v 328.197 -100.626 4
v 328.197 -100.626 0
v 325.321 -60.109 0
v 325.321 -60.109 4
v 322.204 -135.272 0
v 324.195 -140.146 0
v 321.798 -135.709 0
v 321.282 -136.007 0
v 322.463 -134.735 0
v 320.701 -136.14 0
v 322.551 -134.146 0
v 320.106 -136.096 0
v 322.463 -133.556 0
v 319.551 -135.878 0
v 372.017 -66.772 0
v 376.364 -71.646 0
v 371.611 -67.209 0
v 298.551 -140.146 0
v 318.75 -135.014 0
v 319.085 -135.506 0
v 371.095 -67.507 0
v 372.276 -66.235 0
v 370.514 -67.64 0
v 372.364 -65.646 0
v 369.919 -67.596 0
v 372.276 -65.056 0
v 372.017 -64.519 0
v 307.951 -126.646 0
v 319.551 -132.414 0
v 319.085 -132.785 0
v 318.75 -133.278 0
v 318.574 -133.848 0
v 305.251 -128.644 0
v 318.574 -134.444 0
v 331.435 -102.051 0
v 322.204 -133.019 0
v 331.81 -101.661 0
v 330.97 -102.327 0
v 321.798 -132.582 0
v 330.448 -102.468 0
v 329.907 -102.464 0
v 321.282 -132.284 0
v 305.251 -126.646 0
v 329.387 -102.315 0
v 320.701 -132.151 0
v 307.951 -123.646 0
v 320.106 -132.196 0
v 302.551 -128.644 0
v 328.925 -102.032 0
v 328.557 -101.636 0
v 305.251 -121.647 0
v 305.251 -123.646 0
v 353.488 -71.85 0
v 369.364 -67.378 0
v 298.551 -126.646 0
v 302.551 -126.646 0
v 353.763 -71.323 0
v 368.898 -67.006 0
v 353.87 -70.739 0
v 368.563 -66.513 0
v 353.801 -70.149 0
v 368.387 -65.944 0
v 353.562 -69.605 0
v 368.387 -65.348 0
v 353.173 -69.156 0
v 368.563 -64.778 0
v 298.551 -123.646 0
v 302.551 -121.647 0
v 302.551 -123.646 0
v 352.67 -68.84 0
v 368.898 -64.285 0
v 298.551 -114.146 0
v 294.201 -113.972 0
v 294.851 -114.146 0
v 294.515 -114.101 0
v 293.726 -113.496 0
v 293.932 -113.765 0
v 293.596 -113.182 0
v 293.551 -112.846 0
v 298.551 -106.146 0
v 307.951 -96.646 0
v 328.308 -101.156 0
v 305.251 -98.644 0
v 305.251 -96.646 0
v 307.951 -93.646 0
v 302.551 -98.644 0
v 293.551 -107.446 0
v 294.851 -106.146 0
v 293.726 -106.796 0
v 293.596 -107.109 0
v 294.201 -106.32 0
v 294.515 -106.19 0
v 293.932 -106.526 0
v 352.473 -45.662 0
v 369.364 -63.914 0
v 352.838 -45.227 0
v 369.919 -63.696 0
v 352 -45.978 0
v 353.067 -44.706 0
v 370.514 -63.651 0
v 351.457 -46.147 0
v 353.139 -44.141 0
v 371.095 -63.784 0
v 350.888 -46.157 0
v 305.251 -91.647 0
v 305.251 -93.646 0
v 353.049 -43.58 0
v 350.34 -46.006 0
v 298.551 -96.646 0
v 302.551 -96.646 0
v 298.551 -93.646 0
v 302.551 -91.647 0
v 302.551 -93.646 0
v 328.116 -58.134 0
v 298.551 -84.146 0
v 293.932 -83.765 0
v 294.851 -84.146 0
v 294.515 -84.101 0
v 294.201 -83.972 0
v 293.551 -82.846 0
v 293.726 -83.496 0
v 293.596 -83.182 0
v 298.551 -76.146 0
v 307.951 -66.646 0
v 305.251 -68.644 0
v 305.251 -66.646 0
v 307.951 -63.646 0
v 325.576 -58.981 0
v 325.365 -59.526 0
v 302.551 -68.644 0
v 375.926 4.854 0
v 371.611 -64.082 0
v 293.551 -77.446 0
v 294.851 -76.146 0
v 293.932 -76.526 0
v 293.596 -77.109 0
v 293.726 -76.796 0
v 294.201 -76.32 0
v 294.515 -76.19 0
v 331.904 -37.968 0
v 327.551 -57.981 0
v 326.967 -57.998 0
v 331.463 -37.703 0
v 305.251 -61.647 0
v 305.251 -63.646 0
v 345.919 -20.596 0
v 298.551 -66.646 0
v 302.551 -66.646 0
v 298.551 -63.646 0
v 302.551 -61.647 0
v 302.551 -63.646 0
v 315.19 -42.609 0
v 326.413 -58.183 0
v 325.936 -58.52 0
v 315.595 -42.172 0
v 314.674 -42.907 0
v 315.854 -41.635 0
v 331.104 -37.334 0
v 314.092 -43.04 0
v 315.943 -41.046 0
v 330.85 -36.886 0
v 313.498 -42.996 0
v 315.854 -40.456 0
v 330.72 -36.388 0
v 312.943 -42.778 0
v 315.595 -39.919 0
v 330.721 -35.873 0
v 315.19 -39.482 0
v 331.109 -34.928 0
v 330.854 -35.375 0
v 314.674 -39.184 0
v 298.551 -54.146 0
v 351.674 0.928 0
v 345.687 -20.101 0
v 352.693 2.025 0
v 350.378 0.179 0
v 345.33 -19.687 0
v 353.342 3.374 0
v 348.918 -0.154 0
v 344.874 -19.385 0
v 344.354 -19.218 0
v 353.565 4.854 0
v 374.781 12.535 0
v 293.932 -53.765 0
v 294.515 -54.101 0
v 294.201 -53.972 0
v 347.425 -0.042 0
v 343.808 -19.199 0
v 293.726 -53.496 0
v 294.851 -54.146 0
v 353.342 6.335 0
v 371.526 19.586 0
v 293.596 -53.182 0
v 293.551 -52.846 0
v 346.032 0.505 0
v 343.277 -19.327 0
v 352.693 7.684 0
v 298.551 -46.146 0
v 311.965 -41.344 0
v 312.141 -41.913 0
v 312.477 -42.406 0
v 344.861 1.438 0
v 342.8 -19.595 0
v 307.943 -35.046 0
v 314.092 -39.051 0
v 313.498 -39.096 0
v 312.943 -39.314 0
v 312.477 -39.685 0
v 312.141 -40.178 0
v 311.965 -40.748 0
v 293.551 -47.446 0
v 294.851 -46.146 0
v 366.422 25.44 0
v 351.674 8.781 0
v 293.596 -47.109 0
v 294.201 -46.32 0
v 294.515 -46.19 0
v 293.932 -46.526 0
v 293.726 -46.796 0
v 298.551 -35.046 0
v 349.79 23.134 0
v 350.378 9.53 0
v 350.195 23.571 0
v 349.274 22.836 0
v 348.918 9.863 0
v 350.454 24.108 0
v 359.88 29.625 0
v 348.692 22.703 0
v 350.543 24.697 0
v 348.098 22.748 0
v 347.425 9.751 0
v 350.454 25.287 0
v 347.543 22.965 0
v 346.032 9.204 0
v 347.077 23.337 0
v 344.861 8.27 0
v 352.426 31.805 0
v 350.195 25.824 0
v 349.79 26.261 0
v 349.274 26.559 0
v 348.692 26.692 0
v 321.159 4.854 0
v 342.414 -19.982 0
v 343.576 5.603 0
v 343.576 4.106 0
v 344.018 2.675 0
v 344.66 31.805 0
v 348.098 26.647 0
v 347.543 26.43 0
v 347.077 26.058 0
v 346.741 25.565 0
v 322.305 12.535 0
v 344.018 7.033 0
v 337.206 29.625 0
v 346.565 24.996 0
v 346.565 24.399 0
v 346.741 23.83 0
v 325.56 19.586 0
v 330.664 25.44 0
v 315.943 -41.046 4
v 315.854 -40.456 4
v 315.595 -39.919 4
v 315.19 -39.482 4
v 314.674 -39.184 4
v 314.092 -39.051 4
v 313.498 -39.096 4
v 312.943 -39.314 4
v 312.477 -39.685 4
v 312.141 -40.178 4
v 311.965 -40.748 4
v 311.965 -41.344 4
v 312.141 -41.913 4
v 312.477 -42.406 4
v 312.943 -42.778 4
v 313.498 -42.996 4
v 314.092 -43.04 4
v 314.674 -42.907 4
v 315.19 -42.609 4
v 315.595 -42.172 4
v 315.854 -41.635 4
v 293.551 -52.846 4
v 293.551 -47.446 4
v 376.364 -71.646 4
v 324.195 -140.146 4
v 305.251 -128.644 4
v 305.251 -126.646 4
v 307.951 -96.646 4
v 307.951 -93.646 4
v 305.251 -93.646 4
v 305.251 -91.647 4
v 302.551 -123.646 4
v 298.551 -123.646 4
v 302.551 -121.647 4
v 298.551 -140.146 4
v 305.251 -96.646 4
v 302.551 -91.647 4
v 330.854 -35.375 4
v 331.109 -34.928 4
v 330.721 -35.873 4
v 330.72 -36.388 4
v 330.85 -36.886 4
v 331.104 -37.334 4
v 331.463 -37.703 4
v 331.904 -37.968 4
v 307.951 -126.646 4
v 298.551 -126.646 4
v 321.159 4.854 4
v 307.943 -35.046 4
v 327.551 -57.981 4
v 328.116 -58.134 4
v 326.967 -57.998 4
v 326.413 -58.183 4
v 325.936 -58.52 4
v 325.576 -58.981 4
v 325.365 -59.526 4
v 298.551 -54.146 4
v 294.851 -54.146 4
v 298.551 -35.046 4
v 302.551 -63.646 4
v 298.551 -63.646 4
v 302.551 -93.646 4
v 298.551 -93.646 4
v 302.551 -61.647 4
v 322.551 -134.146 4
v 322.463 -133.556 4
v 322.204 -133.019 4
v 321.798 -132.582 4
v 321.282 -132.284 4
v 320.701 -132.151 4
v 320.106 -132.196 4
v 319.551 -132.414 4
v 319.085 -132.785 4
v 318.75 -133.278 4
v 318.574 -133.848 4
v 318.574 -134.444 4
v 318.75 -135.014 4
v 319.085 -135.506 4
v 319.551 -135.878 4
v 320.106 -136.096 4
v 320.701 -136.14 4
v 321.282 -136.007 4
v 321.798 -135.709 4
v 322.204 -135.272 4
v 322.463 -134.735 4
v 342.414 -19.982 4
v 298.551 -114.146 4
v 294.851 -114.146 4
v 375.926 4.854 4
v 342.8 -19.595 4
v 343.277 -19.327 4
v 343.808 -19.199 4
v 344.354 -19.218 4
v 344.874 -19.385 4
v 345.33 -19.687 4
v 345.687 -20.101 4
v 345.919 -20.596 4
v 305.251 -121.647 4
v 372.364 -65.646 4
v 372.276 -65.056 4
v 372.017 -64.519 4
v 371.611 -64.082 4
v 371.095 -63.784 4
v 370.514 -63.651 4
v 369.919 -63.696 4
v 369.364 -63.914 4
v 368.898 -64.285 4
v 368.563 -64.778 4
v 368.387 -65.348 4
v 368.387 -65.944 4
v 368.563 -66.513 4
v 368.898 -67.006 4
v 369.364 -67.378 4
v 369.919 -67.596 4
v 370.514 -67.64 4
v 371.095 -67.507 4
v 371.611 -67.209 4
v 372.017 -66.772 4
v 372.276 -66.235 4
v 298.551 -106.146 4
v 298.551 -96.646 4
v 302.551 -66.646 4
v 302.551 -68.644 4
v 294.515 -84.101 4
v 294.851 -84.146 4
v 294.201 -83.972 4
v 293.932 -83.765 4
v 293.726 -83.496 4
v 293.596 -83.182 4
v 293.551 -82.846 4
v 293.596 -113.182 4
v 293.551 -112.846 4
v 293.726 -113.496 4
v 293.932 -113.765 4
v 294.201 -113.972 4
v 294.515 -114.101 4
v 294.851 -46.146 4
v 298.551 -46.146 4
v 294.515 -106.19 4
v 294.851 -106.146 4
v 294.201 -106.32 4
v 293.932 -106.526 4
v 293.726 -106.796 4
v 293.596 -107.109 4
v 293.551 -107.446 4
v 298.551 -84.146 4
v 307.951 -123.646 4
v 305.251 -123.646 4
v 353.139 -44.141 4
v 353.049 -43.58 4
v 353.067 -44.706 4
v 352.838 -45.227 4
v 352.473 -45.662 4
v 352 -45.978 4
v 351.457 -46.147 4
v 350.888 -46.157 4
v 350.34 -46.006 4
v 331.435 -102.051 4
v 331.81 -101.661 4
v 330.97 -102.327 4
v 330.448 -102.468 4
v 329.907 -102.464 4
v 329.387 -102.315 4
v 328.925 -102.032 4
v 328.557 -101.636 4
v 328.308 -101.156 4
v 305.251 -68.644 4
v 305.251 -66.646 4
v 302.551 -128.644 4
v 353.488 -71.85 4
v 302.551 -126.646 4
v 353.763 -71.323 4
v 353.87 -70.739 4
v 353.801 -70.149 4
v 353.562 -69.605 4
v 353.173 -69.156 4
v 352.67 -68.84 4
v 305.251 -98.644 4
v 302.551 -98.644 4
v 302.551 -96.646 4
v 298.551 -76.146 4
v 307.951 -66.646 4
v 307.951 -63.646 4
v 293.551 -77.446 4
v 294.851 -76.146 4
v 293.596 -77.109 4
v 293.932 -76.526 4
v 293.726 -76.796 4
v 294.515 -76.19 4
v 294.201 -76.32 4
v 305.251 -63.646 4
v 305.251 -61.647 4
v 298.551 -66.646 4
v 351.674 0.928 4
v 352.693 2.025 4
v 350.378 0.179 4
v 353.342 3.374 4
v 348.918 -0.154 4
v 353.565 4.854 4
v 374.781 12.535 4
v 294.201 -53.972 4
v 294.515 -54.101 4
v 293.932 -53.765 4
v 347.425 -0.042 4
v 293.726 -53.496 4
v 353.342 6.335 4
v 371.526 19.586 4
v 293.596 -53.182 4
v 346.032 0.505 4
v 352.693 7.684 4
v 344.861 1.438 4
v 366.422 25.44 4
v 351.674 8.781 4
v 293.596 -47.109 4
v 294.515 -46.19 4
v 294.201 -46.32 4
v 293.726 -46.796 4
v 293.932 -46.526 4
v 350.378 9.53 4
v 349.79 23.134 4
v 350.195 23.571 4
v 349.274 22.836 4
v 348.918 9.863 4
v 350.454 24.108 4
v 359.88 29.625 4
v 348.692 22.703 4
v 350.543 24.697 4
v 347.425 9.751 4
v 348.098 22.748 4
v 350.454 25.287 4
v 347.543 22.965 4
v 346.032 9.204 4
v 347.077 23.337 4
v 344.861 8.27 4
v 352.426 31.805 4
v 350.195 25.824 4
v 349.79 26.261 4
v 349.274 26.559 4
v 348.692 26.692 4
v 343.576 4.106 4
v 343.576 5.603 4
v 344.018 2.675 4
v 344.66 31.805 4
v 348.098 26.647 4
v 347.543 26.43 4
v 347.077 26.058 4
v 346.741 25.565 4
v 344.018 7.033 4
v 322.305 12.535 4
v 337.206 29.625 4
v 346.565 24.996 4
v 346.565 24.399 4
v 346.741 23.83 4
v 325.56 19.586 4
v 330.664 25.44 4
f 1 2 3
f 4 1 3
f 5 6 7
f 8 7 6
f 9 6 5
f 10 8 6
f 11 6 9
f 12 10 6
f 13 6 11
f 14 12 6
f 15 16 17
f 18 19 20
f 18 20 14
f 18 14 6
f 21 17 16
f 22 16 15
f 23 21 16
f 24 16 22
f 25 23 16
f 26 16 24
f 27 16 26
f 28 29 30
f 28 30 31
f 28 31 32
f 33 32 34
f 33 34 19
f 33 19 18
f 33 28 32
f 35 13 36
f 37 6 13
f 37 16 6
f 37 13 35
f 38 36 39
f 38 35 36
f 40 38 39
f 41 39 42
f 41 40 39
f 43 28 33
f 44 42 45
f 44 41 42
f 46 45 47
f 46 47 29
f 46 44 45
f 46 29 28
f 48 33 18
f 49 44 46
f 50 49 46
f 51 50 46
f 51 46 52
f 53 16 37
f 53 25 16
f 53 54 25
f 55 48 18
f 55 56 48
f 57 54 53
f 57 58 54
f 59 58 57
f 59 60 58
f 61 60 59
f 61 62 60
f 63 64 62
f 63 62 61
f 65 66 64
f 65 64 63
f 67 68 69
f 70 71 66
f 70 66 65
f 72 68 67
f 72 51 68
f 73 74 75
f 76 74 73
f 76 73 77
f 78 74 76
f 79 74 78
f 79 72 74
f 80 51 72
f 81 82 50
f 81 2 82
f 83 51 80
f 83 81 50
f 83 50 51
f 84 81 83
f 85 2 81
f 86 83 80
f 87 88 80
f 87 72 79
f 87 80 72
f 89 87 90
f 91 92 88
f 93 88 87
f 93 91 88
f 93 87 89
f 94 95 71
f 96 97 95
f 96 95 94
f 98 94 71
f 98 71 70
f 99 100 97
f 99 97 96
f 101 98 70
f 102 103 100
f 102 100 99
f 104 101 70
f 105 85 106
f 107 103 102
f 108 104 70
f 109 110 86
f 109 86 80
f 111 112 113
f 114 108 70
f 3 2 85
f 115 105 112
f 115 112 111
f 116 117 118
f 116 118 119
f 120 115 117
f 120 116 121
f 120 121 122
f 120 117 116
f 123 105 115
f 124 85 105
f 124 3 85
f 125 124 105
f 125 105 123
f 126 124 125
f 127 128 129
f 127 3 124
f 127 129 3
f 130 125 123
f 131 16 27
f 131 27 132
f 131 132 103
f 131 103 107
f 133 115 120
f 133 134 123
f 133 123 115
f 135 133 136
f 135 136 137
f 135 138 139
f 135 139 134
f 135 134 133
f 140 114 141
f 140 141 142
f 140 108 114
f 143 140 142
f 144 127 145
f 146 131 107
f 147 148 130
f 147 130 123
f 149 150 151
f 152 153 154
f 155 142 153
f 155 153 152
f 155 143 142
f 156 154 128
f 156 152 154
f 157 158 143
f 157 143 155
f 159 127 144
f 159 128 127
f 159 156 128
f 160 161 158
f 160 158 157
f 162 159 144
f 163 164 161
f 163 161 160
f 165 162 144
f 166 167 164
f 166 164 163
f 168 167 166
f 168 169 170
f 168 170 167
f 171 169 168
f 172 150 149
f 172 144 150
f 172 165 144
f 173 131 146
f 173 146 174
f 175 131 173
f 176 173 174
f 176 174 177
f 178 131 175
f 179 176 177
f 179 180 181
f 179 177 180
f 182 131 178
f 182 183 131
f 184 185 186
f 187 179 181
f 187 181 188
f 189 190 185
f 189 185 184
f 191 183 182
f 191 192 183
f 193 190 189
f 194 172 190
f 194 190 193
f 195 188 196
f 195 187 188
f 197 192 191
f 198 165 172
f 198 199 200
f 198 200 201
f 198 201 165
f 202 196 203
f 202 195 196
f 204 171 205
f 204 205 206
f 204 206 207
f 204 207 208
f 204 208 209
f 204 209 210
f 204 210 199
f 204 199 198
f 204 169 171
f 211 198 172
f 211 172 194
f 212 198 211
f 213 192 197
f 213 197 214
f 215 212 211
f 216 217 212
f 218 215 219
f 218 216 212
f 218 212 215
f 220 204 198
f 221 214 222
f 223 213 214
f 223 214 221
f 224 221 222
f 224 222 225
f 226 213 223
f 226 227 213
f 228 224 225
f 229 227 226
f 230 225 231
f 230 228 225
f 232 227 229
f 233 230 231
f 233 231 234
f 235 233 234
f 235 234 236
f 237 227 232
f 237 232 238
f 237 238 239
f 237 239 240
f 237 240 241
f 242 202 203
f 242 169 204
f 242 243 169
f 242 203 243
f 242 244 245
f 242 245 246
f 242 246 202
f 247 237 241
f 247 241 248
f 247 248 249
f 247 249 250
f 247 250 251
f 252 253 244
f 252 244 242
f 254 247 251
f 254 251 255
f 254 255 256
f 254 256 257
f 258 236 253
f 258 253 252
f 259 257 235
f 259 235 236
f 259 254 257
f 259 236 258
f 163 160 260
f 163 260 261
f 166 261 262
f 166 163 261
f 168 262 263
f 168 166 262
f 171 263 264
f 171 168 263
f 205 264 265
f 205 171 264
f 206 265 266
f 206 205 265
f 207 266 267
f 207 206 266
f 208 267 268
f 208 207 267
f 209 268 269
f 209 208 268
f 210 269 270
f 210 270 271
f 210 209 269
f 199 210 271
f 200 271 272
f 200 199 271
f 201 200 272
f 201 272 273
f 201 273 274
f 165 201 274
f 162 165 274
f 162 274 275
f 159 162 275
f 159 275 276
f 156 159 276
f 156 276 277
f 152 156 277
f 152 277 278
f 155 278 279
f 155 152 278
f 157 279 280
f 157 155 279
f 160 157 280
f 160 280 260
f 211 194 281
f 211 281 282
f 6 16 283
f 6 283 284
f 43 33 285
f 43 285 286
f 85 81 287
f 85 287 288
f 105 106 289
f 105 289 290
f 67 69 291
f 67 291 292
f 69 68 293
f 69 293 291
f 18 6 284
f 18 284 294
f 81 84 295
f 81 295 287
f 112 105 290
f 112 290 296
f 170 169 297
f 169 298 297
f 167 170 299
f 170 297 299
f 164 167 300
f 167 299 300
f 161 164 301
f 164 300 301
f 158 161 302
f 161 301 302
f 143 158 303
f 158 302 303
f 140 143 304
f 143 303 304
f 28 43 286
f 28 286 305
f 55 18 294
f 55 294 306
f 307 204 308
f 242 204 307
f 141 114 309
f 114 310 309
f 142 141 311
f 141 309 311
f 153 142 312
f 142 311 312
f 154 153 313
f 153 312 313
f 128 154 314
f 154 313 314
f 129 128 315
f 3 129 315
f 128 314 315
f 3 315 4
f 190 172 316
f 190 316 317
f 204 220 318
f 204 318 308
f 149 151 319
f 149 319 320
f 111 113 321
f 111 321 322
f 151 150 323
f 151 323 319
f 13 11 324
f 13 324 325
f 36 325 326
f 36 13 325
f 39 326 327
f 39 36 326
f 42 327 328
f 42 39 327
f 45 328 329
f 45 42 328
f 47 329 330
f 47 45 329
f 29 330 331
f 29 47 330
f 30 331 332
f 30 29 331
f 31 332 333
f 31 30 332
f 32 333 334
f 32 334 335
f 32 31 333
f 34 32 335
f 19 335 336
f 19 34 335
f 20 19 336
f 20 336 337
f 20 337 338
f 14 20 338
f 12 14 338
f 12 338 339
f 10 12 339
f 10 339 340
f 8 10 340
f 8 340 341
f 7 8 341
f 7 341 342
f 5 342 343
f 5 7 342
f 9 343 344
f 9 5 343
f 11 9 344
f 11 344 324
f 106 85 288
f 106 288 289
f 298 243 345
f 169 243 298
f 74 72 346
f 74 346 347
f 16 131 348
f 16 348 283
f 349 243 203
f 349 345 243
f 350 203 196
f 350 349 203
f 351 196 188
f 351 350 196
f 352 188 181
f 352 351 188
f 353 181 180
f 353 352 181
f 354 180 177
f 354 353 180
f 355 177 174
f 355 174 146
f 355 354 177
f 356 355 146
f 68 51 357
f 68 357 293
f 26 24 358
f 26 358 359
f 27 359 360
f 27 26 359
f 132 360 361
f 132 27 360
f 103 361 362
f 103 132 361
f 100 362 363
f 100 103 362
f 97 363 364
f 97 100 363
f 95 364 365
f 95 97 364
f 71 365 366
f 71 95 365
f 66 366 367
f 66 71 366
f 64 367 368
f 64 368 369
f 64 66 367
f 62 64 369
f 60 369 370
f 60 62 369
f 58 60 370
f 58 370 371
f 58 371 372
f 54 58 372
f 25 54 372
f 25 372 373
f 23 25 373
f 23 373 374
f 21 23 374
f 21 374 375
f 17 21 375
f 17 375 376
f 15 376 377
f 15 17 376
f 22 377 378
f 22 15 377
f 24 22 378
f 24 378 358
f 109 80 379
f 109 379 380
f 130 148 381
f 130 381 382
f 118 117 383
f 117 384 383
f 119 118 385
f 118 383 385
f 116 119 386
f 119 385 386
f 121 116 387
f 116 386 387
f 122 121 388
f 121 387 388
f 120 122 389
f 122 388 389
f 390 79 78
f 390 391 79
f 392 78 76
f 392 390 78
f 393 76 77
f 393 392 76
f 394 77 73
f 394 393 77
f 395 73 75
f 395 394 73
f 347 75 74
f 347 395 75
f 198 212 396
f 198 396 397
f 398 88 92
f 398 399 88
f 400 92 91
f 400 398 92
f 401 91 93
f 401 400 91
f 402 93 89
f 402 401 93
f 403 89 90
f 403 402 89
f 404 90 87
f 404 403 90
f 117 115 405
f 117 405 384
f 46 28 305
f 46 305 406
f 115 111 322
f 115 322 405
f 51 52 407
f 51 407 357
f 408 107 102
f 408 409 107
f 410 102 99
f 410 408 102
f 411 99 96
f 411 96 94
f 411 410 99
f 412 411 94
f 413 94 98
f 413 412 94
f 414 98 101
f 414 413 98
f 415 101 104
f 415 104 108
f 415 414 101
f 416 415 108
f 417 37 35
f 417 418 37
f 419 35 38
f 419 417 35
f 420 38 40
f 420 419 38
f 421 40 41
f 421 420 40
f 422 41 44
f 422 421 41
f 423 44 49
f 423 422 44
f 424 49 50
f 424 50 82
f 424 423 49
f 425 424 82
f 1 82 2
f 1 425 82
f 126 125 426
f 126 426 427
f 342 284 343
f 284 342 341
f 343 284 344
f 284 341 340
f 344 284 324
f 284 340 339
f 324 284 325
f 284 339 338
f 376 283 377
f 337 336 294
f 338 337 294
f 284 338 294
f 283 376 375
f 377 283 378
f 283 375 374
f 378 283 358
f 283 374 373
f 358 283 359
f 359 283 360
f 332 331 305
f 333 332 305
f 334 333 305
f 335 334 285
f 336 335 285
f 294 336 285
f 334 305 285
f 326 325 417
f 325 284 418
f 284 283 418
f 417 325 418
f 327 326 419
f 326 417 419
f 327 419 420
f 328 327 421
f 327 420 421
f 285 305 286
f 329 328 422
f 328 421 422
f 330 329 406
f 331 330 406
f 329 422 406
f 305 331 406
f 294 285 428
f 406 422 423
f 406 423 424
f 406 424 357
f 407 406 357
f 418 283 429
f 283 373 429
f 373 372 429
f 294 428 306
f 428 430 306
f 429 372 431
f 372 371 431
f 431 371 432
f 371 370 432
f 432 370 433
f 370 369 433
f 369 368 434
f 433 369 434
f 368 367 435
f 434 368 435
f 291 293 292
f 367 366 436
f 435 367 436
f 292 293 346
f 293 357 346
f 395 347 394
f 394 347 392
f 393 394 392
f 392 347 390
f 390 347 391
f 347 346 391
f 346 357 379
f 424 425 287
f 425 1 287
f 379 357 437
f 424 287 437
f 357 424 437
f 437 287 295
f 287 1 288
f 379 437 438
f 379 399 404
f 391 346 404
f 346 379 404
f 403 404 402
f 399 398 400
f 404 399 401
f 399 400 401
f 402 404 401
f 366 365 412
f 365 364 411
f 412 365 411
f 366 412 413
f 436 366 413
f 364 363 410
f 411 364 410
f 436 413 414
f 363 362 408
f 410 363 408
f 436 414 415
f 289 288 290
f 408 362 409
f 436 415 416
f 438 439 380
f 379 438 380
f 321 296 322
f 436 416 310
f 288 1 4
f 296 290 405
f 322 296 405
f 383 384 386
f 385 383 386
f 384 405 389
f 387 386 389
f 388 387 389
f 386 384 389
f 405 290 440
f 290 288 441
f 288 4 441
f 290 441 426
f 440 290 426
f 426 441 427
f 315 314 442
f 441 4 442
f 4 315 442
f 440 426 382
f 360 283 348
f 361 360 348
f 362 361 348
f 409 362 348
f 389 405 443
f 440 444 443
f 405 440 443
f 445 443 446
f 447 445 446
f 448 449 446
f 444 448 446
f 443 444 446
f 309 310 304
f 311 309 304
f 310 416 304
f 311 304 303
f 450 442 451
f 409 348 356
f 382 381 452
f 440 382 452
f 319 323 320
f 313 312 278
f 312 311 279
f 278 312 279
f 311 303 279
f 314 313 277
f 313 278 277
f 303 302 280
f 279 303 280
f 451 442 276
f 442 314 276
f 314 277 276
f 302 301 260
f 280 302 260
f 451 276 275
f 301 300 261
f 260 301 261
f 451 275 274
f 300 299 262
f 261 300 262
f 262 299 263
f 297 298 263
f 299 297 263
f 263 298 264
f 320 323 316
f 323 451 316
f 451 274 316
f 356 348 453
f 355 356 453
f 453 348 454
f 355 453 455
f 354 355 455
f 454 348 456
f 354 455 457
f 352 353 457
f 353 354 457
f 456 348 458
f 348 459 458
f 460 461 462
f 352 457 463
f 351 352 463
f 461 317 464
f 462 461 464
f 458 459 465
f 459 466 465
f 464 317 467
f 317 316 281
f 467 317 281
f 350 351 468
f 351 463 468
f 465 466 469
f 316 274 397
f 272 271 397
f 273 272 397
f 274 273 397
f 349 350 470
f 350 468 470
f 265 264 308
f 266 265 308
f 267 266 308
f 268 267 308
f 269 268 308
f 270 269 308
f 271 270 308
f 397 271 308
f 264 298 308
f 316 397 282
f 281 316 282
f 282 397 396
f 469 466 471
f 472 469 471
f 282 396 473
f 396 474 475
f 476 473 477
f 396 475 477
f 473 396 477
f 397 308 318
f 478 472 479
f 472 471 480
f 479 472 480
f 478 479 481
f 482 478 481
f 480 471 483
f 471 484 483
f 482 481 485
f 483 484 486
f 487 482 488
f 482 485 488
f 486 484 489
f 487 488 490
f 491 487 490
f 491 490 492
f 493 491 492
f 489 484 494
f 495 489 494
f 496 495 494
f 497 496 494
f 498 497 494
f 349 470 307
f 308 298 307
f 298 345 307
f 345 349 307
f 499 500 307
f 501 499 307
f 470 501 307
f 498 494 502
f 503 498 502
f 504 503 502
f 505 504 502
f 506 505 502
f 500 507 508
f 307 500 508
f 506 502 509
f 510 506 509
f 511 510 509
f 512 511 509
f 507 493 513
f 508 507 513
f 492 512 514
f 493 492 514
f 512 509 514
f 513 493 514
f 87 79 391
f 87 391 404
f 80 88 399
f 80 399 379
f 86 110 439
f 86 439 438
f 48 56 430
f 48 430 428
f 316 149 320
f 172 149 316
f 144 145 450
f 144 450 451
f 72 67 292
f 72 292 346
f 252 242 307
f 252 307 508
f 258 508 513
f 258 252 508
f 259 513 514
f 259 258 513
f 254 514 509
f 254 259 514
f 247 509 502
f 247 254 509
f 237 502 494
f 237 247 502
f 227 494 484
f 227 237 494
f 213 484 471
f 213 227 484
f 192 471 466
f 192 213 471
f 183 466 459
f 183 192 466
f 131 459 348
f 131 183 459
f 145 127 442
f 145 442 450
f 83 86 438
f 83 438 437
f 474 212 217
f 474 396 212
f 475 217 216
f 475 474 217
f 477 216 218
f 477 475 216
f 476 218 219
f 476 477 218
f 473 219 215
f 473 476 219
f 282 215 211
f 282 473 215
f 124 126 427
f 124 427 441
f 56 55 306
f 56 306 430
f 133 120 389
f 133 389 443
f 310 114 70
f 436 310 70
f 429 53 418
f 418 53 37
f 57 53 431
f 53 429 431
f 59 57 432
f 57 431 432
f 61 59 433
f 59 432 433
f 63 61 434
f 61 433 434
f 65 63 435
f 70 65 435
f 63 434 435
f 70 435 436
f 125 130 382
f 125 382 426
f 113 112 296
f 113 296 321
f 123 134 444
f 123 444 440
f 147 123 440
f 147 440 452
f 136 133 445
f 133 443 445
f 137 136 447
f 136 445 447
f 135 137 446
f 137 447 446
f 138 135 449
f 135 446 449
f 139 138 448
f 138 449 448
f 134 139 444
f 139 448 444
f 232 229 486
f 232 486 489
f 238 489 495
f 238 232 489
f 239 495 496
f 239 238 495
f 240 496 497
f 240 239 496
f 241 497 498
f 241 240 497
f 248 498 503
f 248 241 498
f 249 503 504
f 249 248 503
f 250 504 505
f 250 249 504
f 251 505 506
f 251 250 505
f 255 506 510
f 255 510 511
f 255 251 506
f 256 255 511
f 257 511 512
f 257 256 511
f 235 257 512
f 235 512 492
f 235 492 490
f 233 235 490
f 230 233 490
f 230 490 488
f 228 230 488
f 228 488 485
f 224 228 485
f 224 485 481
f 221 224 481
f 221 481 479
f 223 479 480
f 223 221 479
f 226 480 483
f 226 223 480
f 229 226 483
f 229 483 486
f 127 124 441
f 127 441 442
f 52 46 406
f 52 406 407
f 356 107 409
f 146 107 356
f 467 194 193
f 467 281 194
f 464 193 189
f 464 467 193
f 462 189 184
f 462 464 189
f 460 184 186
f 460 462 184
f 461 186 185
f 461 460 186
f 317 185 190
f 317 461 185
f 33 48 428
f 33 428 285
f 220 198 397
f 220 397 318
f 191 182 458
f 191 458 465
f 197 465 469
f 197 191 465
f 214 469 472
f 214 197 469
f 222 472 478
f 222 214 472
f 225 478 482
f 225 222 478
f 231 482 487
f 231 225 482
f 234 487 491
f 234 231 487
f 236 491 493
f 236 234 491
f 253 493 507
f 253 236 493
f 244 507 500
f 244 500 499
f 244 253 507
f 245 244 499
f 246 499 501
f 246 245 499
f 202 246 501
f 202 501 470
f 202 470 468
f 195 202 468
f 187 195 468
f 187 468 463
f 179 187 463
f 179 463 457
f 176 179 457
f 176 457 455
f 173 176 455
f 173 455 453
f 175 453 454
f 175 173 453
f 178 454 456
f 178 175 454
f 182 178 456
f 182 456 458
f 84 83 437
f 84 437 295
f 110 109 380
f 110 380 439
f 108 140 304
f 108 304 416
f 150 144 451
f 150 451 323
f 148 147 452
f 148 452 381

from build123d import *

# Parameters (mm, degrees)
SKETCH_1_R      = 5.0225
SKETCH_1_R_2    = 2
EXTRUDE_1_DEPTH = 4
FILLET_1_R      = 2
FILLET_2_R      = 1.3


with BuildPart() as part:
    # 草图1 → 凸台-拉伸1 (new body)
    with BuildSketch(Plane.XY):
        with BuildLine():
            Line((298.551498293, -96.645689396), (302.551498293, -96.645689396))
            Line((302.551498293, -96.645689396), (302.551498293, -98.644151028))
            Line((302.551498293, -98.644151028), (305.251498293, -98.644151028))
            Line((305.251498293, -98.644151028), (305.251498293, -96.645689396))
            Line((305.251498293, -96.645689396), (307.951498293, -96.645689396))
            Line((307.951498293, -96.645689396), (307.951498293, -93.645689396))
            Line((307.951498293, -93.645689396), (305.251498293, -93.645689396))
            Line((305.251498293, -93.645689396), (305.251498293, -91.647227763))
            Line((305.251498293, -91.647227763), (302.551498293, -91.647227763))
            Line((302.551498293, -91.647227763), (302.551498293, -93.645689396))
            Line((302.551498293, -93.645689396), (298.551498293, -93.645689396))
            Line((298.551498293, -93.645689396), (298.551498293, -84.145716775))
            Line((298.551498293, -84.145716775), (293.551498293, -84.145716775))
            Line((293.551498293, -84.145716775), (293.551498293, -76.145716775))
            Line((293.551498293, -76.145716775), (298.551498293, -76.145716775))
            Line((298.551498293, -76.145716775), (298.551498293, -66.645694374))
            Line((298.551498293, -66.645694374), (302.551498293, -66.645694374))
            Line((302.551498293, -66.645694374), (302.551498293, -68.644156006))
            Line((302.551498293, -68.644156006), (305.251498293, -68.644156006))
            Line((305.251498293, -68.644156006), (305.251498293, -66.645694374))
            Line((305.251498293, -66.645694374), (307.951498293, -66.645694374))
            Line((307.951498293, -66.645694374), (307.951498293, -63.645694374))
            Line((307.951498293, -63.645694374), (305.251498293, -63.645694374))
            Line((305.251498293, -63.645694374), (305.251498293, -61.647232741))
            Line((305.251498293, -61.647232741), (302.551498293, -61.647232741))
            Line((302.551498293, -61.647232741), (302.551498293, -63.645694374))
            Line((302.551498293, -63.645694374), (298.551498293, -63.645694374))
            Line((298.551498293, -63.645694374), (298.551498293, -54.145671973))
            Line((298.551498293, -54.145671973), (293.551498293, -54.145671973))
            Line((293.551498293, -54.145671973), (293.551498293, -46.145671973))
            Line((293.551498293, -46.145671973), (298.551498293, -46.145671973))
            Line((298.551498293, -46.145671973), (298.551498293, -35.045714286))
            Line((298.551498293, -35.045714286), (307.942857143, -35.045714286))
            Line((307.942857143, -35.045714286), (321.159325739, 4.854285714))
            ThreePointArc((321.159325739, 4.854285714), (348.542857143, 32.081451417), (375.926388547, 4.854285714))
            Line((375.926388547, 4.854285714), (376.364473934, -71.645714286))
            Line((376.364473934, -71.645714286), (324.194731876, -140.145734198))
            Line((324.194731876, -140.145734198), (298.551498293, -140.145734198))
            Line((298.551498293, -140.145734198), (298.551498293, -126.645734198))
            Line((298.551498293, -126.645734198), (302.551498293, -126.645734198))
            Line((302.551498293, -126.645734198), (302.551498293, -128.644195831))
            Line((302.551498293, -128.644195831), (305.251498293, -128.644195831))
            Line((305.251498293, -128.644195831), (305.251498293, -126.645734198))
            Line((305.251498293, -126.645734198), (307.951498293, -126.645734198))
            Line((307.951498293, -126.645734198), (307.951498293, -123.645734198))
            Line((307.951498293, -123.645734198), (305.251498293, -123.645734198))
            Line((305.251498293, -123.645734198), (305.251498293, -121.647272565))
            Line((305.251498293, -121.647272565), (302.551498293, -121.647272565))
            Line((302.551498293, -121.647272565), (302.551498293, -123.645734198))
            Line((302.551498293, -123.645734198), (298.551498293, -123.645734198))
            Line((298.551498293, -123.645734198), (298.551498293, -114.145711797))
            Line((298.551498293, -114.145711797), (293.551498293, -114.145711797))
            Line((293.551498293, -114.145711797), (293.551498293, -106.145711797))
            Line((293.551498293, -106.145711797), (298.551498293, -106.145711797))
            Line((298.551498293, -106.145711797), (298.551498293, -96.645689396))
        make_face()
        with Locations((348.542857143, 4.854285714)):
            Circle(SKETCH_1_R, mode=Mode.SUBTRACT)
        with Locations((348.542857143, 24.697471009)):
            Circle(SKETCH_1_R_2, mode=Mode.SUBTRACT)
        with Locations((320.551498293, -134.145734198)):
            Circle(SKETCH_1_R_2, mode=Mode.SUBTRACT)
        with Locations((370.364473934, -65.645714286)):
            Circle(SKETCH_1_R_2, mode=Mode.SUBTRACT)
        with Locations((313.942857143, -41.045714286)):
            Circle(SKETCH_1_R_2, mode=Mode.SUBTRACT)
        Polygon((354.95315454, -69.835495731), (328.585486884, -106.094838527), (325.087312939, -56.813896117), align=None, mode=Mode.SUBTRACT)
        Polygon((329.57699596, -36.9530828), (354.34318526, -47.751218186), (344.764617274, -16.87417598), align=None, mode=Mode.SUBTRACT)
    extrude(amount=EXTRUDE_1_DEPTH)

    # 圆角1
    fillet_1_edges = [part.edges().sort_by_distance(p)[0] for p in [
        (354.95315454, -69.835495731, 2),
        (325.087312939, -56.813896117, 2),
        (328.585486884, -106.094838527, 2),
        (344.764617274, -16.87417598, 2),
        (329.57699596, -36.9530828, 2),
        (354.34318526, -47.751218186, 2),
    ]]
    fillet(fillet_1_edges, radius=FILLET_1_R)

    # 圆角2
    fillet_2_edges = [part.edges().sort_by_distance(p)[0] for p in [
        (293.551498293, -114.145711797, 2),
        (293.551498293, -106.145711797, 2),
        (293.551498293, -84.145716775, 2),
        (293.551498293, -76.145716775, 2),
        (293.551498293, -54.145671973, 2),
        (293.551498293, -46.145671973, 2),
    ]]
    fillet(fillet_2_edges, radius=FILLET_2_R)


solid = part.part
